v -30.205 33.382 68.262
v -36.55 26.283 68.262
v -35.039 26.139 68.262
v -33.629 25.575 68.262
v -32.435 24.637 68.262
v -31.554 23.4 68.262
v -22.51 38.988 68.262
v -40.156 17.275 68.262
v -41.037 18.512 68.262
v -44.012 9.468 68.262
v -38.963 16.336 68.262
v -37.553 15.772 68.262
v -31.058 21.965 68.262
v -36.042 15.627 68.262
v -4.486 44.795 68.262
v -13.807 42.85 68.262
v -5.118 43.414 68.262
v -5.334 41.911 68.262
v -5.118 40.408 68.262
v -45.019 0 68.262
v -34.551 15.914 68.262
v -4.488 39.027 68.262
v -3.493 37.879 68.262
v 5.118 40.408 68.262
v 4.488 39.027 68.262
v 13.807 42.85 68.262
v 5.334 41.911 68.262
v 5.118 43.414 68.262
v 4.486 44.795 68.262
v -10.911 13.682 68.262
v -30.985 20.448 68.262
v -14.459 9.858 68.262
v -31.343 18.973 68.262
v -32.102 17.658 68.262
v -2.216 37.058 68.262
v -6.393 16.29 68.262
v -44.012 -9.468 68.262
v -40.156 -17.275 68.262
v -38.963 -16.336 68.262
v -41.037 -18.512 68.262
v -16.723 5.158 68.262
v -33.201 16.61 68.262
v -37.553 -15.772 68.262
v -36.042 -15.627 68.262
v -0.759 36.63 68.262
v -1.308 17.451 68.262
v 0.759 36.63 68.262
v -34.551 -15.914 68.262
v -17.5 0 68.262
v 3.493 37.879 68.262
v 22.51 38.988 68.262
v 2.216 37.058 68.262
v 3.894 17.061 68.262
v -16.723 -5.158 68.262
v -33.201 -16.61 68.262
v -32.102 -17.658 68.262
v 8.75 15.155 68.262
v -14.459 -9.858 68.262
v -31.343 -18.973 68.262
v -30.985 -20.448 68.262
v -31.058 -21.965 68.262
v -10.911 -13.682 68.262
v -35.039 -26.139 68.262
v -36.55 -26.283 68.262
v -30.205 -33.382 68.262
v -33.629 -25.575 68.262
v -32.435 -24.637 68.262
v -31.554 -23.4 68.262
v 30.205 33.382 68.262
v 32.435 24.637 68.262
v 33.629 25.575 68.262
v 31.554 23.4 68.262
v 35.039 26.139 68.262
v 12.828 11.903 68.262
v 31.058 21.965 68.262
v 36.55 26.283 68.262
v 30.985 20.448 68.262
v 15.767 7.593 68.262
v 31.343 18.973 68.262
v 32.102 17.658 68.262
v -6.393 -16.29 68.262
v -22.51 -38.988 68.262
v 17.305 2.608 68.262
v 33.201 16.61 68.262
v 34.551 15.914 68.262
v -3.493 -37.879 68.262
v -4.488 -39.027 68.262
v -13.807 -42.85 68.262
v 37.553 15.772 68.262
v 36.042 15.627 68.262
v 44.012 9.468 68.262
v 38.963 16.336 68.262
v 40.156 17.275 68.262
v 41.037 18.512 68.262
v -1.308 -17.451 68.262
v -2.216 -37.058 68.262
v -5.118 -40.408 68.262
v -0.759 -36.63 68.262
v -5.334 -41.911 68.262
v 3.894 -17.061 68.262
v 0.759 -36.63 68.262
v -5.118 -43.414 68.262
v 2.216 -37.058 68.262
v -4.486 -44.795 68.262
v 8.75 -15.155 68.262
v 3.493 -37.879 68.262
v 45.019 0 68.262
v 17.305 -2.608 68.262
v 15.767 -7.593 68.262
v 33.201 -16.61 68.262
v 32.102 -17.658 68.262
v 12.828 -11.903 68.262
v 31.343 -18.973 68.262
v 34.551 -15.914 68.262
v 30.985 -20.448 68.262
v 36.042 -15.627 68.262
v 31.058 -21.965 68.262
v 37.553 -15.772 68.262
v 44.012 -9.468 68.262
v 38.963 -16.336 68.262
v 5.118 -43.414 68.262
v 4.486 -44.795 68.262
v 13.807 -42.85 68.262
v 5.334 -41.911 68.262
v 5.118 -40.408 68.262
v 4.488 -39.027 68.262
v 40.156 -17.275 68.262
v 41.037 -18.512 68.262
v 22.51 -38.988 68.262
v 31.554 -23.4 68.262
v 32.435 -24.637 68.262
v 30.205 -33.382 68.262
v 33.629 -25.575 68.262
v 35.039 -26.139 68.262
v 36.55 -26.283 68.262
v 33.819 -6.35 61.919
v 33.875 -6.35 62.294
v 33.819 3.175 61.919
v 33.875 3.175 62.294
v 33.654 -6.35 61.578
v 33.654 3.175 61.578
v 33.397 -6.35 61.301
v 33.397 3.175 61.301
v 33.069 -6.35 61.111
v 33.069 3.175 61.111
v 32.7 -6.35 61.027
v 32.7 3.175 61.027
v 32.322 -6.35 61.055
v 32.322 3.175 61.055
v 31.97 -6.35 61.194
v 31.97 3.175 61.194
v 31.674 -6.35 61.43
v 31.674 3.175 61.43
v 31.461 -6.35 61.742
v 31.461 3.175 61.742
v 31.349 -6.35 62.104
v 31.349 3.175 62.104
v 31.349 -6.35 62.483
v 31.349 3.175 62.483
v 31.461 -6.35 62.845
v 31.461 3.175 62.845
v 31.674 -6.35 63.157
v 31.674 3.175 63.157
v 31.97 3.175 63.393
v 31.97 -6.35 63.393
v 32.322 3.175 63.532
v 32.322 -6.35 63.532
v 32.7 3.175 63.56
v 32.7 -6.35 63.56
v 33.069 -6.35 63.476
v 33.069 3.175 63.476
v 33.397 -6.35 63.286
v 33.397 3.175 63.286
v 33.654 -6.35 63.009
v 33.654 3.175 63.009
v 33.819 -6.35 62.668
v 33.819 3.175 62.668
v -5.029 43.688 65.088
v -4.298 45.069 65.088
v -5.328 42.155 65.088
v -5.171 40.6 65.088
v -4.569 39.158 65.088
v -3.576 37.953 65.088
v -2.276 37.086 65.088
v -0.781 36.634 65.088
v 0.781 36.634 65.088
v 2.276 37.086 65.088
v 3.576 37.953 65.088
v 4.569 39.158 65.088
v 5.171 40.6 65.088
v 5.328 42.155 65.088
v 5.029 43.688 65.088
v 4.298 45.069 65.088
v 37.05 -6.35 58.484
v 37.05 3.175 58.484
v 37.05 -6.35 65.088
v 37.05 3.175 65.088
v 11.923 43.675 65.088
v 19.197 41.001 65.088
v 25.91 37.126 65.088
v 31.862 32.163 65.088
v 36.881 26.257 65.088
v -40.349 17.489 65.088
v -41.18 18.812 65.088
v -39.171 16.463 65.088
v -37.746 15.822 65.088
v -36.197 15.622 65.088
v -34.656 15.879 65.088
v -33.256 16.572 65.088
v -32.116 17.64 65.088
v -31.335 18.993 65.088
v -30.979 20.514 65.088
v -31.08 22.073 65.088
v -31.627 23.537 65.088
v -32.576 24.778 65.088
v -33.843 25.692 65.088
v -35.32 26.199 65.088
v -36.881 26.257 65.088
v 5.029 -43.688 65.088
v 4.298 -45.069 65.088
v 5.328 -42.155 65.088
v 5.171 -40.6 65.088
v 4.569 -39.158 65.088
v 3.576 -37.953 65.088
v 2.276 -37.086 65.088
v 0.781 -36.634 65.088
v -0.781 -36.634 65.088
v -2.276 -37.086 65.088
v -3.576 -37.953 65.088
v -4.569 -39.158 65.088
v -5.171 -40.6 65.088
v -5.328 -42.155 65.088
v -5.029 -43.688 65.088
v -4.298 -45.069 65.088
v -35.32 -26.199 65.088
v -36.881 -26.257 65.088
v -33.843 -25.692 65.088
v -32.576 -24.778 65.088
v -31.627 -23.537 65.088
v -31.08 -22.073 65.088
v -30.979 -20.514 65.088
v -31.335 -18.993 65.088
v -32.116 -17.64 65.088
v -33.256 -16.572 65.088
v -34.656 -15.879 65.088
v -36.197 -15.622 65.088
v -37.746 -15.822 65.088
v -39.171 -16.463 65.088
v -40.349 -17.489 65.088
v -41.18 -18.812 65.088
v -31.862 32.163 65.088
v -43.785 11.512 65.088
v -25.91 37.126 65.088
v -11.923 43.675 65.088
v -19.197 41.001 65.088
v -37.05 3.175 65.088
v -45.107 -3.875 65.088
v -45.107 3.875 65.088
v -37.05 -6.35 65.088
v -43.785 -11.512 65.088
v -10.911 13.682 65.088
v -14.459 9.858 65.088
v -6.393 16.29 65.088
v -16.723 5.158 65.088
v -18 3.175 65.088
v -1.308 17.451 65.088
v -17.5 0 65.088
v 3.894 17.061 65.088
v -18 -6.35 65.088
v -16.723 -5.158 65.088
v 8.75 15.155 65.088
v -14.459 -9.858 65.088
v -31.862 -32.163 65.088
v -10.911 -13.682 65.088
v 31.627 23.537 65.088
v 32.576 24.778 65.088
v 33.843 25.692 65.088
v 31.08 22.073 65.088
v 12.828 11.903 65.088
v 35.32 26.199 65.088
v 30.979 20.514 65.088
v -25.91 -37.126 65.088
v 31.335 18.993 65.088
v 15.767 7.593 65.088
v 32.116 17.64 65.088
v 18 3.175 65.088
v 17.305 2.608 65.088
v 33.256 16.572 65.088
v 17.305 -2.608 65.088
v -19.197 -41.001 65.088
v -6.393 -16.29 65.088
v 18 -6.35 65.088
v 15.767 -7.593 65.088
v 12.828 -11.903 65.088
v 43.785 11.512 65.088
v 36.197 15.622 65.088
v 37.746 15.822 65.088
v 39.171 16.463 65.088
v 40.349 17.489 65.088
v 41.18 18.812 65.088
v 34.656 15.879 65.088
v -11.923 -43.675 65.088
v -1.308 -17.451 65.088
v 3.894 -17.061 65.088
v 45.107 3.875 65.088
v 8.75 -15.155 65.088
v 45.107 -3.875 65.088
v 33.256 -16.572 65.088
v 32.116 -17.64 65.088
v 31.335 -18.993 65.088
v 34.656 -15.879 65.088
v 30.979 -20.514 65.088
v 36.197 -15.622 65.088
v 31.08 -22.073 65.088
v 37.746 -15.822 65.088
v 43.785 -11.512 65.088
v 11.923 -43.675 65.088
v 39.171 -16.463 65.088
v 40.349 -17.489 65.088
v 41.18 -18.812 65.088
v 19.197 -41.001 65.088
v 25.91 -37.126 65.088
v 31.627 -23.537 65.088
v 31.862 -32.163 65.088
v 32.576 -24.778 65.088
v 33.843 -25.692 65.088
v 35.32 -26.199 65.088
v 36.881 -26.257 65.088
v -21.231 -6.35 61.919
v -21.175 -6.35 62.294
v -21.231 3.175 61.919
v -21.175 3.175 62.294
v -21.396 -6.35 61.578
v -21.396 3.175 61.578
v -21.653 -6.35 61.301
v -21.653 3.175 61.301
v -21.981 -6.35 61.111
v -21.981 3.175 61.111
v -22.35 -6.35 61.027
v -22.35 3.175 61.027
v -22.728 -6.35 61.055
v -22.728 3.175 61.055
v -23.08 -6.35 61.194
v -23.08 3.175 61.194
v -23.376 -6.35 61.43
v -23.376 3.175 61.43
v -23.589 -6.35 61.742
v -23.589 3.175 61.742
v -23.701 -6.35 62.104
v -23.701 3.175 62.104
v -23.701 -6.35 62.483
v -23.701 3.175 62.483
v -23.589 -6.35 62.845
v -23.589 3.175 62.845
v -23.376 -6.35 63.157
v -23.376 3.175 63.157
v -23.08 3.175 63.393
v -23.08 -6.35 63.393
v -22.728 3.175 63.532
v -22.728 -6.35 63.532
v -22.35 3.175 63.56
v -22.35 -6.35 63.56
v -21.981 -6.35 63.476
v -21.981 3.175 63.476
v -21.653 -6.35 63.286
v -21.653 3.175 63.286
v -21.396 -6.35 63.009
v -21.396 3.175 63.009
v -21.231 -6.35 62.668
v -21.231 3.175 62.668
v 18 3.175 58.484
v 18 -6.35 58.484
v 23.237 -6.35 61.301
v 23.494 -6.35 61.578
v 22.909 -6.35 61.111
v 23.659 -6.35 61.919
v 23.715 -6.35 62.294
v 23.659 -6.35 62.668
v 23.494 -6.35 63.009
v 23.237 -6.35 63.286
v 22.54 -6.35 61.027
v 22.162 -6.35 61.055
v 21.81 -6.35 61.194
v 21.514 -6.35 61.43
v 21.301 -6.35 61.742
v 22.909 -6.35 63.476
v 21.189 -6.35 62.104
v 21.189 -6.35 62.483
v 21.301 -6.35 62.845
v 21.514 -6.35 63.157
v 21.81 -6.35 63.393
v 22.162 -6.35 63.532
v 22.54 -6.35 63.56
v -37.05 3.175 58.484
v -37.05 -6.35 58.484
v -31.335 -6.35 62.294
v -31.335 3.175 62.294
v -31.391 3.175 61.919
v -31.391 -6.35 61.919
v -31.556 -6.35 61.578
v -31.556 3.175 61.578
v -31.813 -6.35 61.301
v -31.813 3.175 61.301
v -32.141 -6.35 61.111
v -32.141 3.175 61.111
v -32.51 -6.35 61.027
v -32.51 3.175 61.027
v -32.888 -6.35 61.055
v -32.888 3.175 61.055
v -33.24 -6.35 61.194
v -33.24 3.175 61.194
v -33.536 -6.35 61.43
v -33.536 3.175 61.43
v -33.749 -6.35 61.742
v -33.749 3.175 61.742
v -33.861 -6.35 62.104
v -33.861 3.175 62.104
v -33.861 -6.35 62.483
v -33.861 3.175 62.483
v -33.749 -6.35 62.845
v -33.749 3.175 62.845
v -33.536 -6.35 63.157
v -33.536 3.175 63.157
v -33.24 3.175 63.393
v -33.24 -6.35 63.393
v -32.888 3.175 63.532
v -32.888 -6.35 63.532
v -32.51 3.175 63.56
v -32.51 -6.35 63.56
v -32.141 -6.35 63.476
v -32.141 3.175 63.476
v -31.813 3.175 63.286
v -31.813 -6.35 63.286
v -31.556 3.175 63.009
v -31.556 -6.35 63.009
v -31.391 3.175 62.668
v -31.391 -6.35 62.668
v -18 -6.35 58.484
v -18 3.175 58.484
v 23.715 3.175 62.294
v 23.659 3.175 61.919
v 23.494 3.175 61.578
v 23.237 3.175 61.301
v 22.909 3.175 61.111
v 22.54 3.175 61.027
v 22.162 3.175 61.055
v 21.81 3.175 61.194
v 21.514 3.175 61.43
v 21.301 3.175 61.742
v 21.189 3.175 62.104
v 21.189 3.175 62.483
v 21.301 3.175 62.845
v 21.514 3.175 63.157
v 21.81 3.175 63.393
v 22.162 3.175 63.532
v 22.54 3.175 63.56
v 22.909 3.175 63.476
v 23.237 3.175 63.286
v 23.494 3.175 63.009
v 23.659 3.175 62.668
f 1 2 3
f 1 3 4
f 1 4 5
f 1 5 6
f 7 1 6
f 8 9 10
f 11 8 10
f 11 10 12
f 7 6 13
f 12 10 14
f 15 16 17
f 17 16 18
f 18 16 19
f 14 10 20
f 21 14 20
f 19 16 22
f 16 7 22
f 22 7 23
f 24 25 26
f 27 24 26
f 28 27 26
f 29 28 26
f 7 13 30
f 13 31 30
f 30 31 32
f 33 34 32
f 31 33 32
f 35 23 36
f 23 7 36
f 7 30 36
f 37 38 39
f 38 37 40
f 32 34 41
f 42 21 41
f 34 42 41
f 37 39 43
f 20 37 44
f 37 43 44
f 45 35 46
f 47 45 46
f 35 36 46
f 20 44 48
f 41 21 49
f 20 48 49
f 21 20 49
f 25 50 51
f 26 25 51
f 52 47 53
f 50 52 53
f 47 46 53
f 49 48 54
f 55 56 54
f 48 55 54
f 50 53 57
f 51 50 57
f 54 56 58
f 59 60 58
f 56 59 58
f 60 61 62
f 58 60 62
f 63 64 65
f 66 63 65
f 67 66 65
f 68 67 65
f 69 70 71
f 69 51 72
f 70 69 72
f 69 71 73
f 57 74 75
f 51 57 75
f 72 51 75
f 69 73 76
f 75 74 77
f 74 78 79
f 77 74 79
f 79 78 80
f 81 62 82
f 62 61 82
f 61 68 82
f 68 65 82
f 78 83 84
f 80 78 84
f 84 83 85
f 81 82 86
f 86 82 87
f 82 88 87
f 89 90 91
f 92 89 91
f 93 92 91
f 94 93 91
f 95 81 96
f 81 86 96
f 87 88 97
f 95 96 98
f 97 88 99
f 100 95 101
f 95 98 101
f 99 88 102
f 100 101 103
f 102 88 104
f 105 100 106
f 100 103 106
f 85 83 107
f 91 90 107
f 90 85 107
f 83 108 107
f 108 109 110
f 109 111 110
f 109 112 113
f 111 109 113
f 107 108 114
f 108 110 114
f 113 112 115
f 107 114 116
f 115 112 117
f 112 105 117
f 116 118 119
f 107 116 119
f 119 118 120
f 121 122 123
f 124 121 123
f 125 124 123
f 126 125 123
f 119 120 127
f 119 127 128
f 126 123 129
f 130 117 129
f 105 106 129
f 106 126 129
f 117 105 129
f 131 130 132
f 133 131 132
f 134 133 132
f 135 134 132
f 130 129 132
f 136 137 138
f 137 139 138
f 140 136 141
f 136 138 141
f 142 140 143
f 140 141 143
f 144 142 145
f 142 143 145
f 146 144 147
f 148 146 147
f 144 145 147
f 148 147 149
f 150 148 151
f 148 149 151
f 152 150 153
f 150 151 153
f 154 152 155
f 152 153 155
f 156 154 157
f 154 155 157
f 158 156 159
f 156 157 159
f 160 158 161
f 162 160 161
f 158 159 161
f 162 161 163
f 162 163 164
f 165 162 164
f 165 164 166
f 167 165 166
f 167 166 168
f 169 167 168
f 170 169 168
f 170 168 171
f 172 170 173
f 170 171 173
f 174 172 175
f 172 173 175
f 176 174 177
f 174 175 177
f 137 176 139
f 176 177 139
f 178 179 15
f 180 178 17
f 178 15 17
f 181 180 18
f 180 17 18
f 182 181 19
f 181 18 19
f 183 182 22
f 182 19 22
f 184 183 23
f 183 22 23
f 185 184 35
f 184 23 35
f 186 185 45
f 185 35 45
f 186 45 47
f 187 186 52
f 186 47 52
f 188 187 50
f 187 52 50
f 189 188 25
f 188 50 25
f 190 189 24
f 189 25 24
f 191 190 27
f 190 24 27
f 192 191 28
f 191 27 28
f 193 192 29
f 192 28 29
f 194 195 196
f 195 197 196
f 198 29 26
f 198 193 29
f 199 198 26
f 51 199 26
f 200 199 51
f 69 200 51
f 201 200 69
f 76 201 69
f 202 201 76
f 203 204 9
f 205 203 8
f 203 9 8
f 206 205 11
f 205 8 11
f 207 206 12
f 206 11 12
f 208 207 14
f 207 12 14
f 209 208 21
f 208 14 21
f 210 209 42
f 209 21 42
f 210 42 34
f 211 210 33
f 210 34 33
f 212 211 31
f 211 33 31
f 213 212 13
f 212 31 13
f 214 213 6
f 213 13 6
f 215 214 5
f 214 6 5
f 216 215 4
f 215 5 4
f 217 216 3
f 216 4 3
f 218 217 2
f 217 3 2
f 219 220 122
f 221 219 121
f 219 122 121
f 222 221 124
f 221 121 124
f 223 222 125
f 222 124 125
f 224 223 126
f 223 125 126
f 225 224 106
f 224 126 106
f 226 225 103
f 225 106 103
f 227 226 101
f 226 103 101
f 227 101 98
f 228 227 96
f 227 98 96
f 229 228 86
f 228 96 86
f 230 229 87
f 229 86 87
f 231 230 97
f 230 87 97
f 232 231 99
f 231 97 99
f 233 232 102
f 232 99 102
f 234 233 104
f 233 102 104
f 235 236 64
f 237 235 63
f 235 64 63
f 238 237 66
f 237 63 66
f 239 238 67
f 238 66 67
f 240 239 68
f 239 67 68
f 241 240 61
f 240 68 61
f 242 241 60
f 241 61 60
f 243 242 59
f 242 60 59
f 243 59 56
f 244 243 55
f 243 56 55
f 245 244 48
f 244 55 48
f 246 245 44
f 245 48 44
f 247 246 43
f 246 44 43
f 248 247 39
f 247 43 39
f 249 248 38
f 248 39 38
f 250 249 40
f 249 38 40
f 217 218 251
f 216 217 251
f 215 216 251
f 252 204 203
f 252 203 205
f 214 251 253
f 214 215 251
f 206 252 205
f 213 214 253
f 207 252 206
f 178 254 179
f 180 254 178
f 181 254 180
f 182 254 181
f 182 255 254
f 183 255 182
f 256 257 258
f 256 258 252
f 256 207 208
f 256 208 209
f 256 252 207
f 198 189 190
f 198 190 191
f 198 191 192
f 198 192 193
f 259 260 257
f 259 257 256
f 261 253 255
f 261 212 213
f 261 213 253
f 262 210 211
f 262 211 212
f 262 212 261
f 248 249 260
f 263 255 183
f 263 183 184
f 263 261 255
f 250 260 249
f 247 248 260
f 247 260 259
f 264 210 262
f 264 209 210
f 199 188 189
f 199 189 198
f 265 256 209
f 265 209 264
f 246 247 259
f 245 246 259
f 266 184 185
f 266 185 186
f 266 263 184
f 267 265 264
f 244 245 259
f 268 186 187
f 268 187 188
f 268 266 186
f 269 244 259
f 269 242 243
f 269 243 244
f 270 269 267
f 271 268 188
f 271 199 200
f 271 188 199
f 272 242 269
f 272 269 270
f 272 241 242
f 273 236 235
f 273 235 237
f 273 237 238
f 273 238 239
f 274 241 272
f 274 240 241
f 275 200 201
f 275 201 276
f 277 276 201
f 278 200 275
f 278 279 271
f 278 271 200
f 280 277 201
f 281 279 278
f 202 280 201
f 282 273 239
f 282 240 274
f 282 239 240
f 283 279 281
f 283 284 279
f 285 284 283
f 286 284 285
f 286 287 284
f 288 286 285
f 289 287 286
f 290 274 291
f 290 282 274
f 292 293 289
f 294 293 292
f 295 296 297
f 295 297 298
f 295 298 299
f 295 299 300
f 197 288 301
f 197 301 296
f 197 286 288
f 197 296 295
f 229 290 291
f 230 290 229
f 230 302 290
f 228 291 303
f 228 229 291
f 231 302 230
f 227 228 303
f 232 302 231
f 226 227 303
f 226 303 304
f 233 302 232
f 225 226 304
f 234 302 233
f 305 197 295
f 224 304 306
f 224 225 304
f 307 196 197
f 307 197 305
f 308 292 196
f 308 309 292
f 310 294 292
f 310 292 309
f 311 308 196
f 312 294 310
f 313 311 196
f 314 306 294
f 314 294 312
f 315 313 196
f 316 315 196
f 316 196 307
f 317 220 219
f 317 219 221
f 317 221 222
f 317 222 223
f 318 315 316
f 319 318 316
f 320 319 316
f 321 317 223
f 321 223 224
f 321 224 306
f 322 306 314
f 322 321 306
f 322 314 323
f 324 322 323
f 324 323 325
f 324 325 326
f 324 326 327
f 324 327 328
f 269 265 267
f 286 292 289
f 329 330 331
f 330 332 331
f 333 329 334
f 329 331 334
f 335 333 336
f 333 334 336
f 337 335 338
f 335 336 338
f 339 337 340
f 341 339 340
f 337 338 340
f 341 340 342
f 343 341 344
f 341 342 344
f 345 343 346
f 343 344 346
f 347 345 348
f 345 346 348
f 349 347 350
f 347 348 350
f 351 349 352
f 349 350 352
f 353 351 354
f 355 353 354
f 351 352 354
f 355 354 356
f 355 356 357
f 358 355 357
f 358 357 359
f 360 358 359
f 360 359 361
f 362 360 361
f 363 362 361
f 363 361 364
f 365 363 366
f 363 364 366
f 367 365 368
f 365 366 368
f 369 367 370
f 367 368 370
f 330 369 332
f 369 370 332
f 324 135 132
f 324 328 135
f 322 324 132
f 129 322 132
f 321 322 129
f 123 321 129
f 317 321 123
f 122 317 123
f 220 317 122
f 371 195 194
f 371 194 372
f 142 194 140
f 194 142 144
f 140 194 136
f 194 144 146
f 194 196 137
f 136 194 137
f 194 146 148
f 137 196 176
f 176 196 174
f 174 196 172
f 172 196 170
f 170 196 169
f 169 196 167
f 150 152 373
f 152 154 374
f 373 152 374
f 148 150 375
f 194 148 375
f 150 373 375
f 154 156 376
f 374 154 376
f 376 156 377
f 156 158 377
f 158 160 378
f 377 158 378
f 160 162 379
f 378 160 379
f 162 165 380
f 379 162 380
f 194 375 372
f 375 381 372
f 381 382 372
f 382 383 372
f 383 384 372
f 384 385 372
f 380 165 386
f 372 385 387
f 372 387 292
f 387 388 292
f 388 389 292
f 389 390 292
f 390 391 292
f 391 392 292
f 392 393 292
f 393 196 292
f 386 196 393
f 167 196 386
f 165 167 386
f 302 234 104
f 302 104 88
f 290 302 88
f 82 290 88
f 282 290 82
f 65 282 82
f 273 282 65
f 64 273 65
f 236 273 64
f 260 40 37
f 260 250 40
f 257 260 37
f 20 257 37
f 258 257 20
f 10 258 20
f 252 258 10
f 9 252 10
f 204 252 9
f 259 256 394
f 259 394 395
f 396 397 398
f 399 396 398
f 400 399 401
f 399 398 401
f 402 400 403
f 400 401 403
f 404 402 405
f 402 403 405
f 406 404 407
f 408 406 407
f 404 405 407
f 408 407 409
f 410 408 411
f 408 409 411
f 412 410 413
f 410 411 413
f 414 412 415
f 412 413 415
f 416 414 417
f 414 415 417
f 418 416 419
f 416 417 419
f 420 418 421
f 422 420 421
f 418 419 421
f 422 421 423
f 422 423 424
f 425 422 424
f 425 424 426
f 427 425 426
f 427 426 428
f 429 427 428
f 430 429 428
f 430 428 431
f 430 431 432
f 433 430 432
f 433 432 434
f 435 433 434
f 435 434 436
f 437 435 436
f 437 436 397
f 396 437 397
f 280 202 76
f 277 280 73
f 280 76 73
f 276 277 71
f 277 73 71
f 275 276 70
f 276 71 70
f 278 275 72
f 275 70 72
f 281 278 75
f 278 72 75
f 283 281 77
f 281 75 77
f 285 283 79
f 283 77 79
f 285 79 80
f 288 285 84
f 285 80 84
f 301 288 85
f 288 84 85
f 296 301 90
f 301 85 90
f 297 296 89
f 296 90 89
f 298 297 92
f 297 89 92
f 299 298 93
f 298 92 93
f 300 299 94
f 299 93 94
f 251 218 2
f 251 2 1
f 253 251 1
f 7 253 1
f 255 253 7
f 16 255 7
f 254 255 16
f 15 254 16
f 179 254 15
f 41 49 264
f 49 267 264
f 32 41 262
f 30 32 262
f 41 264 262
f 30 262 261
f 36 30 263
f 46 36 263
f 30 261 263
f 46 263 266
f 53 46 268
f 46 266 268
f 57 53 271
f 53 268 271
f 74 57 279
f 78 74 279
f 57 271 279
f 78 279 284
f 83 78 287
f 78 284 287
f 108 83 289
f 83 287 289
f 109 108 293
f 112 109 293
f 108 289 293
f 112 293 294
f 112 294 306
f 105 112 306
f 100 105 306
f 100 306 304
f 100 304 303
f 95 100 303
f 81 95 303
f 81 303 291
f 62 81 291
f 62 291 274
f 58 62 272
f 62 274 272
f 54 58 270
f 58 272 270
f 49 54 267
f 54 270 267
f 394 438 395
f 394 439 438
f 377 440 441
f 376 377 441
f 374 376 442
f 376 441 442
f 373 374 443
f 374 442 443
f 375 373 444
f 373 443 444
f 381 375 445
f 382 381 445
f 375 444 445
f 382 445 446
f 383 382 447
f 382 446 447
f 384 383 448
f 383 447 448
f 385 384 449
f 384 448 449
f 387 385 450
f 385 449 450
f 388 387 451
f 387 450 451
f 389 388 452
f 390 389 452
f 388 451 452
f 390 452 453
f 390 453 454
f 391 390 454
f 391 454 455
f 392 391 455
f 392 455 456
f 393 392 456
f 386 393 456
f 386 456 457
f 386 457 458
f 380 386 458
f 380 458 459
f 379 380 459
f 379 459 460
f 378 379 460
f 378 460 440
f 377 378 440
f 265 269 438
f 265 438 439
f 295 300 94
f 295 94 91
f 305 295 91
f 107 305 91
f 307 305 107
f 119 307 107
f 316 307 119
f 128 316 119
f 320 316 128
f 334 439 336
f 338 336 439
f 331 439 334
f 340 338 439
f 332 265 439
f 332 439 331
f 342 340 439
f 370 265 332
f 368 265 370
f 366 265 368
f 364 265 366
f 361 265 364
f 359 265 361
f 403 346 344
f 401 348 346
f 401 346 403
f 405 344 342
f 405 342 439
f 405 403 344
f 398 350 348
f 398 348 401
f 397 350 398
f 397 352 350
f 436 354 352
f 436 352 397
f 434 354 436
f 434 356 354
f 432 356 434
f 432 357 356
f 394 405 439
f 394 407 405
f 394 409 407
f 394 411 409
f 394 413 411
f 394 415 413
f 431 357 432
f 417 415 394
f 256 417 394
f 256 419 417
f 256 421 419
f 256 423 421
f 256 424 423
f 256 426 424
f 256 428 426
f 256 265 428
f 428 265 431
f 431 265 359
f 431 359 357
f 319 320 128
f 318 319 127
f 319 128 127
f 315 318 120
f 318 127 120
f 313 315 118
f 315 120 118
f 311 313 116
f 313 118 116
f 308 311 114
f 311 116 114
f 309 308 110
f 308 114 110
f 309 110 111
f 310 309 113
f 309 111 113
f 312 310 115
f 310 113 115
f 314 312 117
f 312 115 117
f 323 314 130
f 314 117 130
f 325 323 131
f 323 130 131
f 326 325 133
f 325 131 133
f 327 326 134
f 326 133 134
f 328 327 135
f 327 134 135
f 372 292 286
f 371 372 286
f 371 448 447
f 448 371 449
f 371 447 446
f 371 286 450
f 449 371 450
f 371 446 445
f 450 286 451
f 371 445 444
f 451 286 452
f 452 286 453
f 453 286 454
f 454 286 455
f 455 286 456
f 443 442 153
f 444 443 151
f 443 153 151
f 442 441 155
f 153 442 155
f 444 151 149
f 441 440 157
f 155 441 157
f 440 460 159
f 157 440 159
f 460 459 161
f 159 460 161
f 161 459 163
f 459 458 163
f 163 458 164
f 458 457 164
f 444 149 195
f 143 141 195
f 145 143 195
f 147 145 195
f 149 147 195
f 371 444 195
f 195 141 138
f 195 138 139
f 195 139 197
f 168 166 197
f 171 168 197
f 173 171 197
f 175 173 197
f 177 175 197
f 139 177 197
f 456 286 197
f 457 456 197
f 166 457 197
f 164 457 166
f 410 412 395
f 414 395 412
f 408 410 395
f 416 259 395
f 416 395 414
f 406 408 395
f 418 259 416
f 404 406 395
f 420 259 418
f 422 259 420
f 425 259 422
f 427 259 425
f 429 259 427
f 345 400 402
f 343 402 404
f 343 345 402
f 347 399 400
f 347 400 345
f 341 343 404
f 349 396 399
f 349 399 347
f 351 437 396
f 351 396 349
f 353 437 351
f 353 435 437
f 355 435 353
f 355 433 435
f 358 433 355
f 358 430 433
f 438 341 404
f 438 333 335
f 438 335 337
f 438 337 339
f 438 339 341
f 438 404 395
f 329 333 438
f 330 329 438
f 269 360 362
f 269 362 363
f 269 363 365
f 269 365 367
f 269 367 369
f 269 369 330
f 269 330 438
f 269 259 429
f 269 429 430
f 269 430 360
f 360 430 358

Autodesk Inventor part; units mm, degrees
ref_plane "YZ Plane" through (0, 0, 0) normal (1, 0, 0) x (0, 1, 0)
ref_plane "XZ Plane" through (0, 0, 0) normal (0, 1, 0) x (-1, 0, 0)
sketch "Sketch1" plane through (0, 0, 0) normal (0, 0, 1) x (1, 0, 0)
  circle A0 centre (0, 0) radius 50.8
  dimension "d0" = 101.6
ref_plane "Work Plane1" through (0, 0, 279.4) normal (0, 0, 1) x (1, 0, 0)
sketch "Sketch2" plane through (0, 0, 279.4) normal (0, 0, 1) x (1, 0, 0)
  circle A0 centre (0, 0) radius 7.1437
  dimension "d3" = 14.2875
loft "Loft2" add profiles "Sketch1", "Sketch2"
sketch "Sketch15" plane through (0, 0, 0) normal (0, 1, 0) x (-1, 0, 0)
  line L0 (-7.1437, 279.4) -> (7.1437, 279.4) projected
  line L1 (0, 279.4) -> (-7.1437, 279.4)
  line L2 (-50.8, 0) -> (50.8, 0) projected
  line L3 (50.8, 0) -> (-50.8, 0)
  line L4 (-50.8, 0) -> (-50.8, 279.4)
  line L5 (-50.8, 279.4) -> (50.8, 279.4)
  line L6 (50.8, 279.4) -> (50.8, 0)
  line L7 (-7.1437, 279.4) -> (0, 302.26)
  line L8 (0, 279.4) -> (0, 88.9)
  line L9 (0, 88.9) -> (-46.3803, 88.9)
  line L10 (0, 0) -> (-50.8, 0)
  line L11 (0, 88.9) -> (0, 0)
  line L12 (0, 84.1375) -> (-46.8411, 84.1375)
  line L13 (0, 68.2625) -> (-48.1941, 68.2625)
  line L14 (-48.1941, 68.2625) -> (-45.0191, 68.2625)
  line L15 (-45.0191, 68.2625) -> (-45.0191, 65.0875)
  line L16 (-45.0191, 65.0875) -> (-45.2731, 65.0875)
  line L17 (-45.2731, 65.0875) -> (-45.0191, 68.2625)
  line L18 (-45.2731, 65.0875) -> (0, 65.0875)
  point P0 (0, 0)
  dimension "d258" = 190.5
  dimension "d259" = 88.9
  dimension "d264" = 4.7625
  dimension "d315" = 3.175
  dimension "d316" = 3.175
  dimension "d317" = 0.254
  dimension "d330" = 15.875
extrude "Extrusion37" cut sketch "Sketch15" along normal through all both and the other way through all
revolve "Revolution11" add sketch "Sketch15" angle 360 about axis through (0, 0, 88.9) along (0, 0, -1) contours L11 L18 L15 L13 | L15 L16 L17
sketch "Sketch59" plane through (0, 0, 68.2625) normal (0, 0, 1) x (1, 0, 0)
  line L0 (0, 0) -> (0, 41.91)
  circle A0 centre (0, 41.91) radius 5.334
  circle A1 centre (-36.2951, 20.955) radius 5.334
  circle A2 centre (-36.2951, -20.955) radius 5.334
  circle A3 centre (0, -41.91) radius 5.334
  circle A4 centre (36.2951, -20.955) radius 5.334
  circle A5 centre (36.2951, 20.955) radius 5.334
  dimension "d319" = 41.91
  dimension "d320" = 10.668
  dimension "d323" = 360
extrude "Extrusion45" cut sketch "Sketch59" against normal blind 25.4
sketch "Sketch60" plane through (0, -41.91, 65.0875) normal (0, 0, -1) x (-1, 0, 0)
  circle A0 centre (0, 41.91) radius 17.5
  point P0 (0, 41.91)
  dimension "d327" = 35
extrude "Extrusion46" cut sketch "Sketch60" against normal blind 25.4
sketch "Sketch61" plane through (0, -41.91, 65.0875) normal (0, 0, -1) x (-1, 0, 0)
  line L0 (18, 45.085) -> (37.05, 45.085)
  line L1 (37.05, 45.085) -> (37.05, 35.56)
  line L2 (37.05, 35.56) -> (18, 35.56)
  line L3 (18, 35.56) -> (18, 45.085)
  line L4 (0, 41.91) -> (0, -3.2701)
  line L5 (-18, 45.085) -> (-37.05, 45.085)
  line L6 (-37.05, 45.085) -> (-37.05, 35.56)
  line L7 (-37.05, 35.56) -> (-18, 35.56)
  line L8 (-18, 35.56) -> (-18, 45.085)
  dimension "d331" = 19.05
  dimension "d332" = 9.525
  dimension "d333" = 18
  dimension "d347" = 3.175
extrude "Extrusion47" add sketch "Sketch61" along normal blind 6.604
sketch "Sketch62" plane through (18, 3.175, 65.0875) normal (0, 1, 0) x (1, 0, 0)
  line L0 (-23.334, 0) -> (-12.666, 0) projected
  line L1 (-18, 0) -> (-18, 51.1143)
  line L2 (19.05, 0) -> (0, 0) projected
  line L3 (19.05, 0) -> (19.05, 6.604) projected
  line L4 (0, 6.604) -> (19.05, 6.604) projected
  line L5 (0, 0) -> (0, 6.604) projected
  circle A0 centre (14.605, 2.794) radius 1.27
  circle A1 centre (4.445, 2.794) radius 1.27
  line L6 (19.05, 6.604) -> (0, 6.604) projected
  line L7 (9.525, 6.604) -> (9.525, 11.5709)
  circle A2 centre (-50.605, 2.794) radius 1.27
  circle A3 centre (-40.445, 2.794) radius 1.27
  point P0 (-18, 65.0875)
  point P1 (-22.2982, 0)
  point P2 (-13.7018, 0)
  dimension "d337" = 2.54
  dimension "d338" = 2.54
  dimension "d339" = 10.16
  dimension "d342" = 5.08
  dimension "d345" = 3.81
  dimension "d346" = 3.81
extrude "Extrusion48" cut sketch "Sketch62" against normal through all contours A0 | A1 | A2 | A3
properties part number "aftServoAssemblyForwardDisc"
